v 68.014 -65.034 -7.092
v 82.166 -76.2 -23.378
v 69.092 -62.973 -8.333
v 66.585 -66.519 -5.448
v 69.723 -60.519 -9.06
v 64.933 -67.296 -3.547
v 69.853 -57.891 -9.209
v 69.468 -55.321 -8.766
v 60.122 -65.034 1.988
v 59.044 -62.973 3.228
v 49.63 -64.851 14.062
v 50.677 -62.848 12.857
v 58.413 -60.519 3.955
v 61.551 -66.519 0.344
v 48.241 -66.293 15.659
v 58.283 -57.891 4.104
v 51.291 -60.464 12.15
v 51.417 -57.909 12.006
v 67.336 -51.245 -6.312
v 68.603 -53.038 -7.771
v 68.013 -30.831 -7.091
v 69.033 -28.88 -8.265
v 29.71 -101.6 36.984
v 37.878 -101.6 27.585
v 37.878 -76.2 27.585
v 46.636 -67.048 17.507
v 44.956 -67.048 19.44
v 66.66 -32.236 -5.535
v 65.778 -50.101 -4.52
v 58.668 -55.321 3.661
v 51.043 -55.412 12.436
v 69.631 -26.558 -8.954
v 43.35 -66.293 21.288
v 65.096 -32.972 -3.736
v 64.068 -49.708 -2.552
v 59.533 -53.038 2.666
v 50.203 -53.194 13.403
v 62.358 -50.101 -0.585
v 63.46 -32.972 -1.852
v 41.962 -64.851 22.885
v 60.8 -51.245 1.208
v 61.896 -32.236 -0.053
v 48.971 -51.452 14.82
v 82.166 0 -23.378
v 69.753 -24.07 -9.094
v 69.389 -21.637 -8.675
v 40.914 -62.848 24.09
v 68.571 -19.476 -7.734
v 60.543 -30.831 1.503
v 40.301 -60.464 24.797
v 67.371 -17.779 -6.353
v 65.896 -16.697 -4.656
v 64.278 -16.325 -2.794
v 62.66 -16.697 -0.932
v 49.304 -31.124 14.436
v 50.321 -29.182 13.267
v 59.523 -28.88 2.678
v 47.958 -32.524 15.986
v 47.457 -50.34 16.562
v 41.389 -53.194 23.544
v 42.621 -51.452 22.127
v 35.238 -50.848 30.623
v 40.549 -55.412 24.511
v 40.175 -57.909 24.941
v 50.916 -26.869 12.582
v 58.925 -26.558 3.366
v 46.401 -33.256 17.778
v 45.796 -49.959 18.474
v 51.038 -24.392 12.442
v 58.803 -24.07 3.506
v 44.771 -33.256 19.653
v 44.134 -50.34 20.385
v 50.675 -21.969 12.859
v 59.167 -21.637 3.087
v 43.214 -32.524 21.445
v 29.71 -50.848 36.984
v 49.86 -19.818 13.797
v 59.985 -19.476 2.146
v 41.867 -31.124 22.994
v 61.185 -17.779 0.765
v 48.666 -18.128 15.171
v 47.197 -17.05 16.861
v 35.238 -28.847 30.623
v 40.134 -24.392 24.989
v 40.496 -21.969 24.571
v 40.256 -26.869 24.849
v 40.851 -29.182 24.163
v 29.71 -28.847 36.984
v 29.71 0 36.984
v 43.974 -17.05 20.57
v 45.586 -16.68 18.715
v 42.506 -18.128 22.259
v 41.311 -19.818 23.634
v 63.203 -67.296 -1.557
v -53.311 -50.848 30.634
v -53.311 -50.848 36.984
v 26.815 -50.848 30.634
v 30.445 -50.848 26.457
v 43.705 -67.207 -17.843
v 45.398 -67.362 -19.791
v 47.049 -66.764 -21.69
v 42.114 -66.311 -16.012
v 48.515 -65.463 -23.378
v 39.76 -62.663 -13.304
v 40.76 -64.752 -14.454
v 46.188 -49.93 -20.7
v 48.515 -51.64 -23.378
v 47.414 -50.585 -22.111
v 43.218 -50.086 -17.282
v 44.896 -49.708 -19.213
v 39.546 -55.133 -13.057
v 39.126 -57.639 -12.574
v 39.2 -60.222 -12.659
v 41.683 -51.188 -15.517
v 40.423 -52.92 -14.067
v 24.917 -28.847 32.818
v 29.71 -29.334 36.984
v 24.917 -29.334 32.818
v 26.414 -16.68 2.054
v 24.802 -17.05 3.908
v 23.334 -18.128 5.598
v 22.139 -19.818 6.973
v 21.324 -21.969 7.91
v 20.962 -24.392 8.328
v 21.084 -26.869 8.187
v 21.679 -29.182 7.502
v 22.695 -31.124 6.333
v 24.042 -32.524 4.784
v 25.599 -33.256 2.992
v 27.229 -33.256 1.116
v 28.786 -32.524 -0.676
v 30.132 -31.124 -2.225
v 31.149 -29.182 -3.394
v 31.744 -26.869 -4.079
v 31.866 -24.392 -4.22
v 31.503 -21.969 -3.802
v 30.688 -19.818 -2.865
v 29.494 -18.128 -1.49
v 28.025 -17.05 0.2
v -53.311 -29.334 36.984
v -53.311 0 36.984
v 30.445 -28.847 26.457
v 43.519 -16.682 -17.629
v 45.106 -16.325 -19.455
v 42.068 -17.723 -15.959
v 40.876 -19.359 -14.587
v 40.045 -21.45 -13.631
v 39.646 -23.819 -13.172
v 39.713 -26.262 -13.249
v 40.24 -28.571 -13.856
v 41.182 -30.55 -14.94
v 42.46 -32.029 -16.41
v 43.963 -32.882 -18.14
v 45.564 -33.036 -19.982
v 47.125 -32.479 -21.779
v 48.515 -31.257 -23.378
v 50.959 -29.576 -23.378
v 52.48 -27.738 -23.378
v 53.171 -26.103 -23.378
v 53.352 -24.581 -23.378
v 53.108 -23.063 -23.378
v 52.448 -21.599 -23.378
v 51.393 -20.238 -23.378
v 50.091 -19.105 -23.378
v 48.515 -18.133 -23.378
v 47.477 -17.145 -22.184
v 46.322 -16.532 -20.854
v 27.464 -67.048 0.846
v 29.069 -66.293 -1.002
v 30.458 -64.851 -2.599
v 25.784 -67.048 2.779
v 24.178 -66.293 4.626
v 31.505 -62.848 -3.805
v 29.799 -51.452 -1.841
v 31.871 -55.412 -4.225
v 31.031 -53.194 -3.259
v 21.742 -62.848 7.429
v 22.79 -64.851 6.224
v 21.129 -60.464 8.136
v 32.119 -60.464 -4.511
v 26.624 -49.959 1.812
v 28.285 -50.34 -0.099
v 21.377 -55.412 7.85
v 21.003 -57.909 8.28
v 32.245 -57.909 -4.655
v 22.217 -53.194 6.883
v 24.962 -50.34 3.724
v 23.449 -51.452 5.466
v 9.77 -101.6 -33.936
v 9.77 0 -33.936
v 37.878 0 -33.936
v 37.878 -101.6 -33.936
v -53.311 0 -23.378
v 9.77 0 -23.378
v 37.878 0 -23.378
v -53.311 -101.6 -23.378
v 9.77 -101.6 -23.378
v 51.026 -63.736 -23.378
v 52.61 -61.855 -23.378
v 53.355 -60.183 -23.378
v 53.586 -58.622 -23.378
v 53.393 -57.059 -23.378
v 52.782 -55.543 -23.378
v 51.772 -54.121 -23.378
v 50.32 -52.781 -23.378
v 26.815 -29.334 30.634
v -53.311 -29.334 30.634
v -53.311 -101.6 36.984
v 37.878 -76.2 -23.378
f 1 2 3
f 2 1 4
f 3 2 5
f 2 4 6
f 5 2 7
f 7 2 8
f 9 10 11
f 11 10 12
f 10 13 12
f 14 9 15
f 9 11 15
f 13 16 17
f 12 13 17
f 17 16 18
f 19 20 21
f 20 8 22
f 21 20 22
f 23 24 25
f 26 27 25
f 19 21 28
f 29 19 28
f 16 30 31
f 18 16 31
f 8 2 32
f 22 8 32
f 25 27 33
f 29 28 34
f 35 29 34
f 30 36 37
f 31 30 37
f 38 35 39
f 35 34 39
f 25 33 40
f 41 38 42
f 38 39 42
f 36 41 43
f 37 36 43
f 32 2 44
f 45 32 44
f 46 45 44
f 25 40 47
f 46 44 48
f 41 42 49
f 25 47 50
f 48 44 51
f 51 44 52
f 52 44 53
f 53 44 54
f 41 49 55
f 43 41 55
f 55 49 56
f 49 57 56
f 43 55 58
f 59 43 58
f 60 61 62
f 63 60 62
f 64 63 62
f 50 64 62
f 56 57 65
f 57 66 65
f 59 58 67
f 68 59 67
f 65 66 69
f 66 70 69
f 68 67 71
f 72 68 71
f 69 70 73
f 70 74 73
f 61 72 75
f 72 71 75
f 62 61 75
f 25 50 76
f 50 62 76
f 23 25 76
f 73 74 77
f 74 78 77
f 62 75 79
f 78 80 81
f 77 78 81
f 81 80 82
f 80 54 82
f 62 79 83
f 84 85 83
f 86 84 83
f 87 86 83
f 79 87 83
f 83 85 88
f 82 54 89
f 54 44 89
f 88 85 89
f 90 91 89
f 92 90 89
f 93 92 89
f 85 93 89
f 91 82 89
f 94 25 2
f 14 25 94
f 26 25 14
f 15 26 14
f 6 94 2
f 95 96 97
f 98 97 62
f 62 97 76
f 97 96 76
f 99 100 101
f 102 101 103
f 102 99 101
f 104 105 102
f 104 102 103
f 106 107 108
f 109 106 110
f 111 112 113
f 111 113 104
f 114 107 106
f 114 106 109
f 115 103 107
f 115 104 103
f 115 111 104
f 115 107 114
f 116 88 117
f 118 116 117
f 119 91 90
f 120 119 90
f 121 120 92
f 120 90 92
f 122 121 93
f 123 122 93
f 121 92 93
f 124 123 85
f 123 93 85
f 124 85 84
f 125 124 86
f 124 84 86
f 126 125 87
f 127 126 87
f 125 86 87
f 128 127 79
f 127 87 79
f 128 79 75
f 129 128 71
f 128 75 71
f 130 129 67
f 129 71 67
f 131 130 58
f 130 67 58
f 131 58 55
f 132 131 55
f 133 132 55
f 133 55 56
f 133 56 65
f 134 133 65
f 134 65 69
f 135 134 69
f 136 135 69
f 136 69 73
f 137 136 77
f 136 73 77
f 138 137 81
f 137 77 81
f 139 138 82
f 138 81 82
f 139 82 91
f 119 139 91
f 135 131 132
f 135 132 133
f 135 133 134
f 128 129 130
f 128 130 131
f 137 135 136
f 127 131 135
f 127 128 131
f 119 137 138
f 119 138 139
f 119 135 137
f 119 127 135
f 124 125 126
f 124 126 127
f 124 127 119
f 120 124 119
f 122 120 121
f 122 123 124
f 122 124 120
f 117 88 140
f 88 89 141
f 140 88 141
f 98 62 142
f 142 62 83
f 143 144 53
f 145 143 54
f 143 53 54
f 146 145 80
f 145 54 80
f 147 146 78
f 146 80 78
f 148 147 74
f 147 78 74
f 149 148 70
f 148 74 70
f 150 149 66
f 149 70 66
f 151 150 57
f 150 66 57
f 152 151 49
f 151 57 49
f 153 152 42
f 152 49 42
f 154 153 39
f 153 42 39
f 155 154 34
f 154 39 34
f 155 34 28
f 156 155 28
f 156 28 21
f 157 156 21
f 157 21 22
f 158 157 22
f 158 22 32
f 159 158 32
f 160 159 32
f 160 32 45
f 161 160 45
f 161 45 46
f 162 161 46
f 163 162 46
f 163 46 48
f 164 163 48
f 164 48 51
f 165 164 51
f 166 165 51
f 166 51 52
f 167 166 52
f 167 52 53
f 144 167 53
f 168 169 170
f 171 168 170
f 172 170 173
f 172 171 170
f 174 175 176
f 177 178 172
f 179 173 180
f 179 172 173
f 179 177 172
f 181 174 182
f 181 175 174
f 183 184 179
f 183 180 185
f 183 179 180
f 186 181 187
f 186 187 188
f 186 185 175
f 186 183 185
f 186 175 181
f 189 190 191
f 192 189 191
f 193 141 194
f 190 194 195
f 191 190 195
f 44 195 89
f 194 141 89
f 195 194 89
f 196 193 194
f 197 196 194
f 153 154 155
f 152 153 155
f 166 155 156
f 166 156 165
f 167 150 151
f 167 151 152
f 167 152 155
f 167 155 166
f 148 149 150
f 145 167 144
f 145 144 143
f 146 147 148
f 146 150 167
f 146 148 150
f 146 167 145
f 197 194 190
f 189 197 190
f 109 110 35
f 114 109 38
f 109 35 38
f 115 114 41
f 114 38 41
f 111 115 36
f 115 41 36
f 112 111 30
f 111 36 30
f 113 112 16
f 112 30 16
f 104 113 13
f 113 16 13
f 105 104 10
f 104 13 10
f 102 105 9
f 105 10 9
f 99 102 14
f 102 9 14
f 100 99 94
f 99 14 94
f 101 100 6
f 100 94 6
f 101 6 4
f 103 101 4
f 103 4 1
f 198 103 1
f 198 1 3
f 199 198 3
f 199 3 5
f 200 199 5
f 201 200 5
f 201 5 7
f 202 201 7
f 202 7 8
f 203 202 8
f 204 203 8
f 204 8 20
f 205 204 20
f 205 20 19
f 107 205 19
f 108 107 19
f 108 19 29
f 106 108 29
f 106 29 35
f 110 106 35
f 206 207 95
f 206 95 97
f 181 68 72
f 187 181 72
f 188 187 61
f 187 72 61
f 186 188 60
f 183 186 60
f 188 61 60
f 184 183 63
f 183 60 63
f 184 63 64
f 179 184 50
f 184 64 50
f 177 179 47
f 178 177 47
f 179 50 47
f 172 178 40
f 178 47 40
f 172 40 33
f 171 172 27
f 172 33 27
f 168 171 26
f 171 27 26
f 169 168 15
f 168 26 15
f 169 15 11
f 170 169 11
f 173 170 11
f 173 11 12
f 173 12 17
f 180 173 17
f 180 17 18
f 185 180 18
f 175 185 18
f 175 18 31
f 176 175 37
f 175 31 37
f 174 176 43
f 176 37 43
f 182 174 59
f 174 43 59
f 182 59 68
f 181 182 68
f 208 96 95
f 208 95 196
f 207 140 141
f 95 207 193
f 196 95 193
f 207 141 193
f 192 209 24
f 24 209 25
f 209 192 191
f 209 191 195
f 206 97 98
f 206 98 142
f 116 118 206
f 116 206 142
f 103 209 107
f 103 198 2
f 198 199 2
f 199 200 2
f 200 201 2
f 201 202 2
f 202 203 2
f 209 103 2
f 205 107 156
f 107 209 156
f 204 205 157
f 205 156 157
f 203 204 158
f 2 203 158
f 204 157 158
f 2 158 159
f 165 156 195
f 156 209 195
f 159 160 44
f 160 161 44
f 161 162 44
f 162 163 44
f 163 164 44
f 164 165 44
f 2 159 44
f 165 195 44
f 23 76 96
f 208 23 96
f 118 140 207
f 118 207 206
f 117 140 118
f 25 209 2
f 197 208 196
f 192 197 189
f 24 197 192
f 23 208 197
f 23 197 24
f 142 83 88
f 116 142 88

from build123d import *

# Parameters (mm, degrees)
F1_DEPTH = 101.6
F2_W     = 83.0206293613
F2_H     = 21.5133689344
F3_DEPTH = 6.35
F5_DEPTH = 6.35
F4_R     = 8.5928571877
F4_R_2   = 8.3348569543
F4_R_3   = 8.3703398653
F4_R_4   = 8.8433843917
F6_DEPTH = 25.4
F8_DEPTH = 25.4


with BuildPart() as f1:
    # F0 (on Front) → F1 (new body)
    with BuildSketch(Plane.XZ):
        Polygon((29.7097470611, 36.9836613536), (-53.3108823001, 36.9836613536), (-53.3108823001, -23.3776271343), (9.7702555358, -23.3776271343), (9.7702555358, -33.9363776147), (37.8775633872, -33.9363776147), (37.8775633872, -23.3776271343), (82.1659564972, -23.3776271343), align=None)
    extrude(amount=F1_DEPTH)

    # F2 (on face) → F3 (cut)
    with BuildSketch(Plane.XY.offset(36.9836613536)):
        with Locations((-11.8005676195, -40.090886876)):
            Rectangle(F2_W, F2_H)
    extrude(amount=-F3_DEPTH, mode=Mode.SUBTRACT)

    # F4 (on face) → F5 (cut)
    with BuildSketch(Plane(origin=(35.2375904862, 0, 30.6227794812), x_dir=(0, 1, 0), z_dir=(0.7548028054, 0, 0.6559517703))):
        Polygon((-29.3342024088, 8.4272101627), (-50.8475713432, 8.4272101627), (-50.8475713432, 0), (-28.8472529501, 0), (-28.8472529501, 8.4272101627), align=None)
    extrude(amount=-F5_DEPTH, mode=Mode.SUBTRACT)

    # F4 (on face) → F6 (cut)
    with BuildSketch(Plane(origin=(35.2375904862, 0, 30.6227794812), x_dir=(0, 1, 0), z_dir=(0.7548028054, 0, 0.6559517703))):
        with Locations((-58.5515610874, -16.0959567875)):
            Circle(F4_R)
        with Locations((-25.0144358724, -15.7757736742)):
            Circle(F4_R_2)
        with Locations((-24.6950350702, -44.2721843719)):
            Circle(F4_R_3)
        with Locations((-58.5515610874, -43.9519882202)):
            Circle(F4_R_4)
    extrude(amount=-F6_DEPTH, mode=Mode.SUBTRACT)

    # F7 (on face) → F8 (cut)
    with BuildSketch(Plane.XZ.offset(101.6)):
        Polygon((37.8775633872, 27.584966273), (37.8775633872, -23.3776271343), (82.1659564972, -23.3776271343), align=None)
    extrude(amount=-F8_DEPTH, mode=Mode.SUBTRACT)


solid = f1.part
